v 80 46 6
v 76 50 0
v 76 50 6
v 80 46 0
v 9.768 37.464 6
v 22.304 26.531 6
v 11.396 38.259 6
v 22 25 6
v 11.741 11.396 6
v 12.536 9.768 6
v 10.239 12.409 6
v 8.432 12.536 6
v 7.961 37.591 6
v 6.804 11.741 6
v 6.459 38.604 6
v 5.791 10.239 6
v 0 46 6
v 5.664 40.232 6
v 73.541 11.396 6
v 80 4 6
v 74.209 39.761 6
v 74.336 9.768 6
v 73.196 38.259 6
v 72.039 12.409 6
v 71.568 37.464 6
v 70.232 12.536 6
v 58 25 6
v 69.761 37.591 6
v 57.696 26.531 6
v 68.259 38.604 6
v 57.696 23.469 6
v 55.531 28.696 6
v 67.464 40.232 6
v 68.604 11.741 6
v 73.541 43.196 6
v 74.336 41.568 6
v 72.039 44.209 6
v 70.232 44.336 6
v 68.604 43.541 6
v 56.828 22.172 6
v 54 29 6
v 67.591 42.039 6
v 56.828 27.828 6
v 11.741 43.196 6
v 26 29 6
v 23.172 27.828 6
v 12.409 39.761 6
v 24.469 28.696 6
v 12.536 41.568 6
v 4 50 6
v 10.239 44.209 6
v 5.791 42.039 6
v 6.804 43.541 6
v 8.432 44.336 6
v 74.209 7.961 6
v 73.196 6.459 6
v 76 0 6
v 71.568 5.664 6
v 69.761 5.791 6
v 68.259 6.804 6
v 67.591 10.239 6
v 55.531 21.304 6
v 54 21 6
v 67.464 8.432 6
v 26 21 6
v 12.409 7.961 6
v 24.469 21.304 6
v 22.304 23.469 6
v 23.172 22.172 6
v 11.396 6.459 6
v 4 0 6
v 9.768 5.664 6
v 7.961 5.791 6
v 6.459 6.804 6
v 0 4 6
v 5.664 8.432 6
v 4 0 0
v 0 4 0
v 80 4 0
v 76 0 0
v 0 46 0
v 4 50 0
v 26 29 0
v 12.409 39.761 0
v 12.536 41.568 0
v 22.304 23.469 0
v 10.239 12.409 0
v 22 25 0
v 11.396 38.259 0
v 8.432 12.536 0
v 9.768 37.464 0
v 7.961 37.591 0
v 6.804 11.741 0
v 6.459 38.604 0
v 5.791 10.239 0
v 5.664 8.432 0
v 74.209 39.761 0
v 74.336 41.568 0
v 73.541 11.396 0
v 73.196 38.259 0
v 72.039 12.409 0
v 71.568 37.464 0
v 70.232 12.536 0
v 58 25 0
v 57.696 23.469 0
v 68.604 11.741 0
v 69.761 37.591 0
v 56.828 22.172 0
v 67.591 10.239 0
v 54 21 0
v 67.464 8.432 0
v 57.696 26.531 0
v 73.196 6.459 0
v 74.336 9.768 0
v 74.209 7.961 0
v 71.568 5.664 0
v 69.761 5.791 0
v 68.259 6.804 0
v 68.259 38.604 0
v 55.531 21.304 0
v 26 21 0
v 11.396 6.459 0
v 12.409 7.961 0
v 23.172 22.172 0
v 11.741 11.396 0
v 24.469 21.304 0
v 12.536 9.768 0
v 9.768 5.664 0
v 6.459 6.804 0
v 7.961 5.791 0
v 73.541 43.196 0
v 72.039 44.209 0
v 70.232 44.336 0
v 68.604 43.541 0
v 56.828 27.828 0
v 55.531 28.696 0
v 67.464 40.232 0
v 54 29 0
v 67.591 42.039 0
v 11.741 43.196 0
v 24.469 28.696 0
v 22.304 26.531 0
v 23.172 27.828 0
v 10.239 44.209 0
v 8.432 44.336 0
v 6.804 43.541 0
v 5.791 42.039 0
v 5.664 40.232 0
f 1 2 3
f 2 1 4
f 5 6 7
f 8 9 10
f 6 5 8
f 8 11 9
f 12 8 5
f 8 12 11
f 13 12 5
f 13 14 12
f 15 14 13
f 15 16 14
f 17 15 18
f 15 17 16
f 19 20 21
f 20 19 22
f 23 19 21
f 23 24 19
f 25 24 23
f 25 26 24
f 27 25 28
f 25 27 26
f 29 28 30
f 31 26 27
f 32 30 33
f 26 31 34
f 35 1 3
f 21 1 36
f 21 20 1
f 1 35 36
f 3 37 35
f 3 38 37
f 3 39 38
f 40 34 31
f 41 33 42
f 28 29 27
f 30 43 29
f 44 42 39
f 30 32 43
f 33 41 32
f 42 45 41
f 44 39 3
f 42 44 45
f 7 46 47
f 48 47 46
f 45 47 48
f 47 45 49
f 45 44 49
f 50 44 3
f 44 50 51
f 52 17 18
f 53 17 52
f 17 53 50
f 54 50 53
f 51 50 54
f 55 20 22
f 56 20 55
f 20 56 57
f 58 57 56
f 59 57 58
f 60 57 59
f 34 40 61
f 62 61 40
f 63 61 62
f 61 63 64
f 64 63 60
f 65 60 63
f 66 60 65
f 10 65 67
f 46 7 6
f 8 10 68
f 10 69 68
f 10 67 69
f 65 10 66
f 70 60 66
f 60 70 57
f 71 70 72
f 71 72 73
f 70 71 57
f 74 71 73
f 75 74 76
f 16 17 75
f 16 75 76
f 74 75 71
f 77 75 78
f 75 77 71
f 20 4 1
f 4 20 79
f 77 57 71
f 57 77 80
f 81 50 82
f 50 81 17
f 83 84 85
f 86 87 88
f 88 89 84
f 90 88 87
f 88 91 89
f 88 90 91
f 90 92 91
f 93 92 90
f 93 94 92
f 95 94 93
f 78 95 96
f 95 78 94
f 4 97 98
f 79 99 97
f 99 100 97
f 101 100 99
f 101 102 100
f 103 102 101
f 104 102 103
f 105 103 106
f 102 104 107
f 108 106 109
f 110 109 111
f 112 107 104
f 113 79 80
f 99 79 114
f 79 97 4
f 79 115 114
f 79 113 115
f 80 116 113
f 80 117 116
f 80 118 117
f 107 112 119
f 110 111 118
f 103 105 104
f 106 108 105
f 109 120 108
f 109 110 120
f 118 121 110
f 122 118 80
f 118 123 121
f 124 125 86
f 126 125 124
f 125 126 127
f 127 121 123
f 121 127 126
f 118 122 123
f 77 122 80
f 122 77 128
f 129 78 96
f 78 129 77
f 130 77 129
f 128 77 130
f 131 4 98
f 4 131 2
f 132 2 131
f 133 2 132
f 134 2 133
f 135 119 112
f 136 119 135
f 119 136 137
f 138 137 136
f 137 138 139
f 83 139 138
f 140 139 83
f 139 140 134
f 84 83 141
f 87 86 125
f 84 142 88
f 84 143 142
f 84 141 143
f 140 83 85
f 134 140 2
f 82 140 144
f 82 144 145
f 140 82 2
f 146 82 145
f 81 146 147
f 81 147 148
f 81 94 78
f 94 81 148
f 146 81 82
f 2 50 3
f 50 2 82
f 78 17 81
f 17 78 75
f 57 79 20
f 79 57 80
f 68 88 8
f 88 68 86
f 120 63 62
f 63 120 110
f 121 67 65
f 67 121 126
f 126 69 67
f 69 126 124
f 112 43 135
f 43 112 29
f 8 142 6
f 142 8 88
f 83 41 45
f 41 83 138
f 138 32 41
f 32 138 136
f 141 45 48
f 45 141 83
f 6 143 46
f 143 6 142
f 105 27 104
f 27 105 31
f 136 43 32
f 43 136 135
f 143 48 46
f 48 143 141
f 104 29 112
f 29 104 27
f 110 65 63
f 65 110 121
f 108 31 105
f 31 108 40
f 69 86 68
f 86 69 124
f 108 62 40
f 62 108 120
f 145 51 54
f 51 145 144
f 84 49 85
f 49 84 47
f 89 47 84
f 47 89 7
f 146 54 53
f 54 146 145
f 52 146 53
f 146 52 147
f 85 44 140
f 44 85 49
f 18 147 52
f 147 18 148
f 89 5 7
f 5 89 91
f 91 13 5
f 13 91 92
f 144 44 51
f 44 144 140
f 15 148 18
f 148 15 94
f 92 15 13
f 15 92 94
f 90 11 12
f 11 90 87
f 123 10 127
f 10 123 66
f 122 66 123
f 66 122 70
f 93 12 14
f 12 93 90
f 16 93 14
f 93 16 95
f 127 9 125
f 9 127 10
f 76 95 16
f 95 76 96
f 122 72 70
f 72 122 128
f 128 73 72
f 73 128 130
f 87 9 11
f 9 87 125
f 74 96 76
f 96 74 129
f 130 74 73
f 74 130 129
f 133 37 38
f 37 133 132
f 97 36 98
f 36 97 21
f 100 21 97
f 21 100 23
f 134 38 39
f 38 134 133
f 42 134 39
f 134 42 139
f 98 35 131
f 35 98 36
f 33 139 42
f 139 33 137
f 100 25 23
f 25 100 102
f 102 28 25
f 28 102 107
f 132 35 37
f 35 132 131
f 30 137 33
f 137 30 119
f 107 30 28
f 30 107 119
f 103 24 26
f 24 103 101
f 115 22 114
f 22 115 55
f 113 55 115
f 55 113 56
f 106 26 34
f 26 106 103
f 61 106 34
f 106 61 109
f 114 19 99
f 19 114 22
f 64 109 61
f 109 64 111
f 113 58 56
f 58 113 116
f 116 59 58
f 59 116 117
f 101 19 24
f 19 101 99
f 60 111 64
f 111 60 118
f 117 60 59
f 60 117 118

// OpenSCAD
$fn = 32;

// ----------------------------------------------------------------------
// Bracket plate: slot plate 80 x 50
// ----------------------------------------------------------------------

// --- parameters (mm) ---
hole_r = 3.5;             // bolt hole radius
plate_t = 6;              // plate thickness, Z (extrusion height)
plate_l = 80;             // plate length
plate_w = 50;             // plate width
slot_l = 28;              // slot straight length
slot_r = 4;               // slot end radius
fit_tol = 0.05;           // declared fit tolerance (prompt contract)
free_tol = 0.2;           // declared free tolerance (prompt contract)

slot_len = slot_l + 2 * slot_r;
slot_w = 2 * slot_r;
hole_d2 = 2 * hole_r;

profile = [[4, 0], [76, 0], [80, 4], [80, 46], [76, 50], [4, 50], [0, 46], [0, 4]];  // primary outline, 8 points, counter clockwise
void_1 = [[54, 21], [55.531, 21.304], [56.828, 22.172], [57.696, 23.469], [58, 25], [57.696, 26.531], [56.828, 27.828], [55.531, 28.696], [54, 29], [26, 29], [24.469, 28.696], [23.172, 27.828], [22.304, 26.531], [22, 25], [22.304, 23.469], [23.172, 22.172], [24.469, 21.304], [26, 21]];  // grip slot, 18 points
void_2 = [[12.536, 41.568], [11.741, 43.196], [10.239, 44.209], [8.432, 44.336], [6.804, 43.541], [5.791, 42.039], [5.664, 40.232], [6.459, 38.604], [7.961, 37.591], [9.768, 37.464], [11.396, 38.259], [12.409, 39.761]];  // corner hole, 12 points
void_3 = [[12.536, 9.768], [11.741, 11.396], [10.239, 12.409], [8.432, 12.536], [6.804, 11.741], [5.791, 10.239], [5.664, 8.432], [6.459, 6.804], [7.961, 5.791], [9.768, 5.664], [11.396, 6.459], [12.409, 7.961]];  // corner hole, 12 points
void_4 = [[74.336, 41.568], [73.541, 43.196], [72.039, 44.209], [70.232, 44.336], [68.604, 43.541], [67.591, 42.039], [67.464, 40.232], [68.259, 38.604], [69.761, 37.591], [71.568, 37.464], [73.196, 38.259], [74.209, 39.761]];  // corner hole, 12 points
void_5 = [[74.336, 9.768], [73.541, 11.396], [72.039, 12.409], [70.232, 12.536], [68.604, 11.741], [67.591, 10.239], [67.464, 8.432], [68.259, 6.804], [69.761, 5.791], [71.568, 5.664], [73.196, 6.459], [74.209, 7.961]];  // corner hole, 12 points

// --- the one profile operation ---
difference() {
  linear_extrude(height = plate_t) polygon(points = profile);
  translate([0, 0, -1])
    linear_extrude(height = plate_t + 2) polygon(points = void_1);
  translate([0, 0, -1])
    linear_extrude(height = plate_t + 2) polygon(points = void_2);
  translate([0, 0, -1])
    linear_extrude(height = plate_t + 2) polygon(points = void_3);
  translate([0, 0, -1])
    linear_extrude(height = plate_t + 2) polygon(points = void_4);
  translate([0, 0, -1])
    linear_extrude(height = plate_t + 2) polygon(points = void_5);
}
